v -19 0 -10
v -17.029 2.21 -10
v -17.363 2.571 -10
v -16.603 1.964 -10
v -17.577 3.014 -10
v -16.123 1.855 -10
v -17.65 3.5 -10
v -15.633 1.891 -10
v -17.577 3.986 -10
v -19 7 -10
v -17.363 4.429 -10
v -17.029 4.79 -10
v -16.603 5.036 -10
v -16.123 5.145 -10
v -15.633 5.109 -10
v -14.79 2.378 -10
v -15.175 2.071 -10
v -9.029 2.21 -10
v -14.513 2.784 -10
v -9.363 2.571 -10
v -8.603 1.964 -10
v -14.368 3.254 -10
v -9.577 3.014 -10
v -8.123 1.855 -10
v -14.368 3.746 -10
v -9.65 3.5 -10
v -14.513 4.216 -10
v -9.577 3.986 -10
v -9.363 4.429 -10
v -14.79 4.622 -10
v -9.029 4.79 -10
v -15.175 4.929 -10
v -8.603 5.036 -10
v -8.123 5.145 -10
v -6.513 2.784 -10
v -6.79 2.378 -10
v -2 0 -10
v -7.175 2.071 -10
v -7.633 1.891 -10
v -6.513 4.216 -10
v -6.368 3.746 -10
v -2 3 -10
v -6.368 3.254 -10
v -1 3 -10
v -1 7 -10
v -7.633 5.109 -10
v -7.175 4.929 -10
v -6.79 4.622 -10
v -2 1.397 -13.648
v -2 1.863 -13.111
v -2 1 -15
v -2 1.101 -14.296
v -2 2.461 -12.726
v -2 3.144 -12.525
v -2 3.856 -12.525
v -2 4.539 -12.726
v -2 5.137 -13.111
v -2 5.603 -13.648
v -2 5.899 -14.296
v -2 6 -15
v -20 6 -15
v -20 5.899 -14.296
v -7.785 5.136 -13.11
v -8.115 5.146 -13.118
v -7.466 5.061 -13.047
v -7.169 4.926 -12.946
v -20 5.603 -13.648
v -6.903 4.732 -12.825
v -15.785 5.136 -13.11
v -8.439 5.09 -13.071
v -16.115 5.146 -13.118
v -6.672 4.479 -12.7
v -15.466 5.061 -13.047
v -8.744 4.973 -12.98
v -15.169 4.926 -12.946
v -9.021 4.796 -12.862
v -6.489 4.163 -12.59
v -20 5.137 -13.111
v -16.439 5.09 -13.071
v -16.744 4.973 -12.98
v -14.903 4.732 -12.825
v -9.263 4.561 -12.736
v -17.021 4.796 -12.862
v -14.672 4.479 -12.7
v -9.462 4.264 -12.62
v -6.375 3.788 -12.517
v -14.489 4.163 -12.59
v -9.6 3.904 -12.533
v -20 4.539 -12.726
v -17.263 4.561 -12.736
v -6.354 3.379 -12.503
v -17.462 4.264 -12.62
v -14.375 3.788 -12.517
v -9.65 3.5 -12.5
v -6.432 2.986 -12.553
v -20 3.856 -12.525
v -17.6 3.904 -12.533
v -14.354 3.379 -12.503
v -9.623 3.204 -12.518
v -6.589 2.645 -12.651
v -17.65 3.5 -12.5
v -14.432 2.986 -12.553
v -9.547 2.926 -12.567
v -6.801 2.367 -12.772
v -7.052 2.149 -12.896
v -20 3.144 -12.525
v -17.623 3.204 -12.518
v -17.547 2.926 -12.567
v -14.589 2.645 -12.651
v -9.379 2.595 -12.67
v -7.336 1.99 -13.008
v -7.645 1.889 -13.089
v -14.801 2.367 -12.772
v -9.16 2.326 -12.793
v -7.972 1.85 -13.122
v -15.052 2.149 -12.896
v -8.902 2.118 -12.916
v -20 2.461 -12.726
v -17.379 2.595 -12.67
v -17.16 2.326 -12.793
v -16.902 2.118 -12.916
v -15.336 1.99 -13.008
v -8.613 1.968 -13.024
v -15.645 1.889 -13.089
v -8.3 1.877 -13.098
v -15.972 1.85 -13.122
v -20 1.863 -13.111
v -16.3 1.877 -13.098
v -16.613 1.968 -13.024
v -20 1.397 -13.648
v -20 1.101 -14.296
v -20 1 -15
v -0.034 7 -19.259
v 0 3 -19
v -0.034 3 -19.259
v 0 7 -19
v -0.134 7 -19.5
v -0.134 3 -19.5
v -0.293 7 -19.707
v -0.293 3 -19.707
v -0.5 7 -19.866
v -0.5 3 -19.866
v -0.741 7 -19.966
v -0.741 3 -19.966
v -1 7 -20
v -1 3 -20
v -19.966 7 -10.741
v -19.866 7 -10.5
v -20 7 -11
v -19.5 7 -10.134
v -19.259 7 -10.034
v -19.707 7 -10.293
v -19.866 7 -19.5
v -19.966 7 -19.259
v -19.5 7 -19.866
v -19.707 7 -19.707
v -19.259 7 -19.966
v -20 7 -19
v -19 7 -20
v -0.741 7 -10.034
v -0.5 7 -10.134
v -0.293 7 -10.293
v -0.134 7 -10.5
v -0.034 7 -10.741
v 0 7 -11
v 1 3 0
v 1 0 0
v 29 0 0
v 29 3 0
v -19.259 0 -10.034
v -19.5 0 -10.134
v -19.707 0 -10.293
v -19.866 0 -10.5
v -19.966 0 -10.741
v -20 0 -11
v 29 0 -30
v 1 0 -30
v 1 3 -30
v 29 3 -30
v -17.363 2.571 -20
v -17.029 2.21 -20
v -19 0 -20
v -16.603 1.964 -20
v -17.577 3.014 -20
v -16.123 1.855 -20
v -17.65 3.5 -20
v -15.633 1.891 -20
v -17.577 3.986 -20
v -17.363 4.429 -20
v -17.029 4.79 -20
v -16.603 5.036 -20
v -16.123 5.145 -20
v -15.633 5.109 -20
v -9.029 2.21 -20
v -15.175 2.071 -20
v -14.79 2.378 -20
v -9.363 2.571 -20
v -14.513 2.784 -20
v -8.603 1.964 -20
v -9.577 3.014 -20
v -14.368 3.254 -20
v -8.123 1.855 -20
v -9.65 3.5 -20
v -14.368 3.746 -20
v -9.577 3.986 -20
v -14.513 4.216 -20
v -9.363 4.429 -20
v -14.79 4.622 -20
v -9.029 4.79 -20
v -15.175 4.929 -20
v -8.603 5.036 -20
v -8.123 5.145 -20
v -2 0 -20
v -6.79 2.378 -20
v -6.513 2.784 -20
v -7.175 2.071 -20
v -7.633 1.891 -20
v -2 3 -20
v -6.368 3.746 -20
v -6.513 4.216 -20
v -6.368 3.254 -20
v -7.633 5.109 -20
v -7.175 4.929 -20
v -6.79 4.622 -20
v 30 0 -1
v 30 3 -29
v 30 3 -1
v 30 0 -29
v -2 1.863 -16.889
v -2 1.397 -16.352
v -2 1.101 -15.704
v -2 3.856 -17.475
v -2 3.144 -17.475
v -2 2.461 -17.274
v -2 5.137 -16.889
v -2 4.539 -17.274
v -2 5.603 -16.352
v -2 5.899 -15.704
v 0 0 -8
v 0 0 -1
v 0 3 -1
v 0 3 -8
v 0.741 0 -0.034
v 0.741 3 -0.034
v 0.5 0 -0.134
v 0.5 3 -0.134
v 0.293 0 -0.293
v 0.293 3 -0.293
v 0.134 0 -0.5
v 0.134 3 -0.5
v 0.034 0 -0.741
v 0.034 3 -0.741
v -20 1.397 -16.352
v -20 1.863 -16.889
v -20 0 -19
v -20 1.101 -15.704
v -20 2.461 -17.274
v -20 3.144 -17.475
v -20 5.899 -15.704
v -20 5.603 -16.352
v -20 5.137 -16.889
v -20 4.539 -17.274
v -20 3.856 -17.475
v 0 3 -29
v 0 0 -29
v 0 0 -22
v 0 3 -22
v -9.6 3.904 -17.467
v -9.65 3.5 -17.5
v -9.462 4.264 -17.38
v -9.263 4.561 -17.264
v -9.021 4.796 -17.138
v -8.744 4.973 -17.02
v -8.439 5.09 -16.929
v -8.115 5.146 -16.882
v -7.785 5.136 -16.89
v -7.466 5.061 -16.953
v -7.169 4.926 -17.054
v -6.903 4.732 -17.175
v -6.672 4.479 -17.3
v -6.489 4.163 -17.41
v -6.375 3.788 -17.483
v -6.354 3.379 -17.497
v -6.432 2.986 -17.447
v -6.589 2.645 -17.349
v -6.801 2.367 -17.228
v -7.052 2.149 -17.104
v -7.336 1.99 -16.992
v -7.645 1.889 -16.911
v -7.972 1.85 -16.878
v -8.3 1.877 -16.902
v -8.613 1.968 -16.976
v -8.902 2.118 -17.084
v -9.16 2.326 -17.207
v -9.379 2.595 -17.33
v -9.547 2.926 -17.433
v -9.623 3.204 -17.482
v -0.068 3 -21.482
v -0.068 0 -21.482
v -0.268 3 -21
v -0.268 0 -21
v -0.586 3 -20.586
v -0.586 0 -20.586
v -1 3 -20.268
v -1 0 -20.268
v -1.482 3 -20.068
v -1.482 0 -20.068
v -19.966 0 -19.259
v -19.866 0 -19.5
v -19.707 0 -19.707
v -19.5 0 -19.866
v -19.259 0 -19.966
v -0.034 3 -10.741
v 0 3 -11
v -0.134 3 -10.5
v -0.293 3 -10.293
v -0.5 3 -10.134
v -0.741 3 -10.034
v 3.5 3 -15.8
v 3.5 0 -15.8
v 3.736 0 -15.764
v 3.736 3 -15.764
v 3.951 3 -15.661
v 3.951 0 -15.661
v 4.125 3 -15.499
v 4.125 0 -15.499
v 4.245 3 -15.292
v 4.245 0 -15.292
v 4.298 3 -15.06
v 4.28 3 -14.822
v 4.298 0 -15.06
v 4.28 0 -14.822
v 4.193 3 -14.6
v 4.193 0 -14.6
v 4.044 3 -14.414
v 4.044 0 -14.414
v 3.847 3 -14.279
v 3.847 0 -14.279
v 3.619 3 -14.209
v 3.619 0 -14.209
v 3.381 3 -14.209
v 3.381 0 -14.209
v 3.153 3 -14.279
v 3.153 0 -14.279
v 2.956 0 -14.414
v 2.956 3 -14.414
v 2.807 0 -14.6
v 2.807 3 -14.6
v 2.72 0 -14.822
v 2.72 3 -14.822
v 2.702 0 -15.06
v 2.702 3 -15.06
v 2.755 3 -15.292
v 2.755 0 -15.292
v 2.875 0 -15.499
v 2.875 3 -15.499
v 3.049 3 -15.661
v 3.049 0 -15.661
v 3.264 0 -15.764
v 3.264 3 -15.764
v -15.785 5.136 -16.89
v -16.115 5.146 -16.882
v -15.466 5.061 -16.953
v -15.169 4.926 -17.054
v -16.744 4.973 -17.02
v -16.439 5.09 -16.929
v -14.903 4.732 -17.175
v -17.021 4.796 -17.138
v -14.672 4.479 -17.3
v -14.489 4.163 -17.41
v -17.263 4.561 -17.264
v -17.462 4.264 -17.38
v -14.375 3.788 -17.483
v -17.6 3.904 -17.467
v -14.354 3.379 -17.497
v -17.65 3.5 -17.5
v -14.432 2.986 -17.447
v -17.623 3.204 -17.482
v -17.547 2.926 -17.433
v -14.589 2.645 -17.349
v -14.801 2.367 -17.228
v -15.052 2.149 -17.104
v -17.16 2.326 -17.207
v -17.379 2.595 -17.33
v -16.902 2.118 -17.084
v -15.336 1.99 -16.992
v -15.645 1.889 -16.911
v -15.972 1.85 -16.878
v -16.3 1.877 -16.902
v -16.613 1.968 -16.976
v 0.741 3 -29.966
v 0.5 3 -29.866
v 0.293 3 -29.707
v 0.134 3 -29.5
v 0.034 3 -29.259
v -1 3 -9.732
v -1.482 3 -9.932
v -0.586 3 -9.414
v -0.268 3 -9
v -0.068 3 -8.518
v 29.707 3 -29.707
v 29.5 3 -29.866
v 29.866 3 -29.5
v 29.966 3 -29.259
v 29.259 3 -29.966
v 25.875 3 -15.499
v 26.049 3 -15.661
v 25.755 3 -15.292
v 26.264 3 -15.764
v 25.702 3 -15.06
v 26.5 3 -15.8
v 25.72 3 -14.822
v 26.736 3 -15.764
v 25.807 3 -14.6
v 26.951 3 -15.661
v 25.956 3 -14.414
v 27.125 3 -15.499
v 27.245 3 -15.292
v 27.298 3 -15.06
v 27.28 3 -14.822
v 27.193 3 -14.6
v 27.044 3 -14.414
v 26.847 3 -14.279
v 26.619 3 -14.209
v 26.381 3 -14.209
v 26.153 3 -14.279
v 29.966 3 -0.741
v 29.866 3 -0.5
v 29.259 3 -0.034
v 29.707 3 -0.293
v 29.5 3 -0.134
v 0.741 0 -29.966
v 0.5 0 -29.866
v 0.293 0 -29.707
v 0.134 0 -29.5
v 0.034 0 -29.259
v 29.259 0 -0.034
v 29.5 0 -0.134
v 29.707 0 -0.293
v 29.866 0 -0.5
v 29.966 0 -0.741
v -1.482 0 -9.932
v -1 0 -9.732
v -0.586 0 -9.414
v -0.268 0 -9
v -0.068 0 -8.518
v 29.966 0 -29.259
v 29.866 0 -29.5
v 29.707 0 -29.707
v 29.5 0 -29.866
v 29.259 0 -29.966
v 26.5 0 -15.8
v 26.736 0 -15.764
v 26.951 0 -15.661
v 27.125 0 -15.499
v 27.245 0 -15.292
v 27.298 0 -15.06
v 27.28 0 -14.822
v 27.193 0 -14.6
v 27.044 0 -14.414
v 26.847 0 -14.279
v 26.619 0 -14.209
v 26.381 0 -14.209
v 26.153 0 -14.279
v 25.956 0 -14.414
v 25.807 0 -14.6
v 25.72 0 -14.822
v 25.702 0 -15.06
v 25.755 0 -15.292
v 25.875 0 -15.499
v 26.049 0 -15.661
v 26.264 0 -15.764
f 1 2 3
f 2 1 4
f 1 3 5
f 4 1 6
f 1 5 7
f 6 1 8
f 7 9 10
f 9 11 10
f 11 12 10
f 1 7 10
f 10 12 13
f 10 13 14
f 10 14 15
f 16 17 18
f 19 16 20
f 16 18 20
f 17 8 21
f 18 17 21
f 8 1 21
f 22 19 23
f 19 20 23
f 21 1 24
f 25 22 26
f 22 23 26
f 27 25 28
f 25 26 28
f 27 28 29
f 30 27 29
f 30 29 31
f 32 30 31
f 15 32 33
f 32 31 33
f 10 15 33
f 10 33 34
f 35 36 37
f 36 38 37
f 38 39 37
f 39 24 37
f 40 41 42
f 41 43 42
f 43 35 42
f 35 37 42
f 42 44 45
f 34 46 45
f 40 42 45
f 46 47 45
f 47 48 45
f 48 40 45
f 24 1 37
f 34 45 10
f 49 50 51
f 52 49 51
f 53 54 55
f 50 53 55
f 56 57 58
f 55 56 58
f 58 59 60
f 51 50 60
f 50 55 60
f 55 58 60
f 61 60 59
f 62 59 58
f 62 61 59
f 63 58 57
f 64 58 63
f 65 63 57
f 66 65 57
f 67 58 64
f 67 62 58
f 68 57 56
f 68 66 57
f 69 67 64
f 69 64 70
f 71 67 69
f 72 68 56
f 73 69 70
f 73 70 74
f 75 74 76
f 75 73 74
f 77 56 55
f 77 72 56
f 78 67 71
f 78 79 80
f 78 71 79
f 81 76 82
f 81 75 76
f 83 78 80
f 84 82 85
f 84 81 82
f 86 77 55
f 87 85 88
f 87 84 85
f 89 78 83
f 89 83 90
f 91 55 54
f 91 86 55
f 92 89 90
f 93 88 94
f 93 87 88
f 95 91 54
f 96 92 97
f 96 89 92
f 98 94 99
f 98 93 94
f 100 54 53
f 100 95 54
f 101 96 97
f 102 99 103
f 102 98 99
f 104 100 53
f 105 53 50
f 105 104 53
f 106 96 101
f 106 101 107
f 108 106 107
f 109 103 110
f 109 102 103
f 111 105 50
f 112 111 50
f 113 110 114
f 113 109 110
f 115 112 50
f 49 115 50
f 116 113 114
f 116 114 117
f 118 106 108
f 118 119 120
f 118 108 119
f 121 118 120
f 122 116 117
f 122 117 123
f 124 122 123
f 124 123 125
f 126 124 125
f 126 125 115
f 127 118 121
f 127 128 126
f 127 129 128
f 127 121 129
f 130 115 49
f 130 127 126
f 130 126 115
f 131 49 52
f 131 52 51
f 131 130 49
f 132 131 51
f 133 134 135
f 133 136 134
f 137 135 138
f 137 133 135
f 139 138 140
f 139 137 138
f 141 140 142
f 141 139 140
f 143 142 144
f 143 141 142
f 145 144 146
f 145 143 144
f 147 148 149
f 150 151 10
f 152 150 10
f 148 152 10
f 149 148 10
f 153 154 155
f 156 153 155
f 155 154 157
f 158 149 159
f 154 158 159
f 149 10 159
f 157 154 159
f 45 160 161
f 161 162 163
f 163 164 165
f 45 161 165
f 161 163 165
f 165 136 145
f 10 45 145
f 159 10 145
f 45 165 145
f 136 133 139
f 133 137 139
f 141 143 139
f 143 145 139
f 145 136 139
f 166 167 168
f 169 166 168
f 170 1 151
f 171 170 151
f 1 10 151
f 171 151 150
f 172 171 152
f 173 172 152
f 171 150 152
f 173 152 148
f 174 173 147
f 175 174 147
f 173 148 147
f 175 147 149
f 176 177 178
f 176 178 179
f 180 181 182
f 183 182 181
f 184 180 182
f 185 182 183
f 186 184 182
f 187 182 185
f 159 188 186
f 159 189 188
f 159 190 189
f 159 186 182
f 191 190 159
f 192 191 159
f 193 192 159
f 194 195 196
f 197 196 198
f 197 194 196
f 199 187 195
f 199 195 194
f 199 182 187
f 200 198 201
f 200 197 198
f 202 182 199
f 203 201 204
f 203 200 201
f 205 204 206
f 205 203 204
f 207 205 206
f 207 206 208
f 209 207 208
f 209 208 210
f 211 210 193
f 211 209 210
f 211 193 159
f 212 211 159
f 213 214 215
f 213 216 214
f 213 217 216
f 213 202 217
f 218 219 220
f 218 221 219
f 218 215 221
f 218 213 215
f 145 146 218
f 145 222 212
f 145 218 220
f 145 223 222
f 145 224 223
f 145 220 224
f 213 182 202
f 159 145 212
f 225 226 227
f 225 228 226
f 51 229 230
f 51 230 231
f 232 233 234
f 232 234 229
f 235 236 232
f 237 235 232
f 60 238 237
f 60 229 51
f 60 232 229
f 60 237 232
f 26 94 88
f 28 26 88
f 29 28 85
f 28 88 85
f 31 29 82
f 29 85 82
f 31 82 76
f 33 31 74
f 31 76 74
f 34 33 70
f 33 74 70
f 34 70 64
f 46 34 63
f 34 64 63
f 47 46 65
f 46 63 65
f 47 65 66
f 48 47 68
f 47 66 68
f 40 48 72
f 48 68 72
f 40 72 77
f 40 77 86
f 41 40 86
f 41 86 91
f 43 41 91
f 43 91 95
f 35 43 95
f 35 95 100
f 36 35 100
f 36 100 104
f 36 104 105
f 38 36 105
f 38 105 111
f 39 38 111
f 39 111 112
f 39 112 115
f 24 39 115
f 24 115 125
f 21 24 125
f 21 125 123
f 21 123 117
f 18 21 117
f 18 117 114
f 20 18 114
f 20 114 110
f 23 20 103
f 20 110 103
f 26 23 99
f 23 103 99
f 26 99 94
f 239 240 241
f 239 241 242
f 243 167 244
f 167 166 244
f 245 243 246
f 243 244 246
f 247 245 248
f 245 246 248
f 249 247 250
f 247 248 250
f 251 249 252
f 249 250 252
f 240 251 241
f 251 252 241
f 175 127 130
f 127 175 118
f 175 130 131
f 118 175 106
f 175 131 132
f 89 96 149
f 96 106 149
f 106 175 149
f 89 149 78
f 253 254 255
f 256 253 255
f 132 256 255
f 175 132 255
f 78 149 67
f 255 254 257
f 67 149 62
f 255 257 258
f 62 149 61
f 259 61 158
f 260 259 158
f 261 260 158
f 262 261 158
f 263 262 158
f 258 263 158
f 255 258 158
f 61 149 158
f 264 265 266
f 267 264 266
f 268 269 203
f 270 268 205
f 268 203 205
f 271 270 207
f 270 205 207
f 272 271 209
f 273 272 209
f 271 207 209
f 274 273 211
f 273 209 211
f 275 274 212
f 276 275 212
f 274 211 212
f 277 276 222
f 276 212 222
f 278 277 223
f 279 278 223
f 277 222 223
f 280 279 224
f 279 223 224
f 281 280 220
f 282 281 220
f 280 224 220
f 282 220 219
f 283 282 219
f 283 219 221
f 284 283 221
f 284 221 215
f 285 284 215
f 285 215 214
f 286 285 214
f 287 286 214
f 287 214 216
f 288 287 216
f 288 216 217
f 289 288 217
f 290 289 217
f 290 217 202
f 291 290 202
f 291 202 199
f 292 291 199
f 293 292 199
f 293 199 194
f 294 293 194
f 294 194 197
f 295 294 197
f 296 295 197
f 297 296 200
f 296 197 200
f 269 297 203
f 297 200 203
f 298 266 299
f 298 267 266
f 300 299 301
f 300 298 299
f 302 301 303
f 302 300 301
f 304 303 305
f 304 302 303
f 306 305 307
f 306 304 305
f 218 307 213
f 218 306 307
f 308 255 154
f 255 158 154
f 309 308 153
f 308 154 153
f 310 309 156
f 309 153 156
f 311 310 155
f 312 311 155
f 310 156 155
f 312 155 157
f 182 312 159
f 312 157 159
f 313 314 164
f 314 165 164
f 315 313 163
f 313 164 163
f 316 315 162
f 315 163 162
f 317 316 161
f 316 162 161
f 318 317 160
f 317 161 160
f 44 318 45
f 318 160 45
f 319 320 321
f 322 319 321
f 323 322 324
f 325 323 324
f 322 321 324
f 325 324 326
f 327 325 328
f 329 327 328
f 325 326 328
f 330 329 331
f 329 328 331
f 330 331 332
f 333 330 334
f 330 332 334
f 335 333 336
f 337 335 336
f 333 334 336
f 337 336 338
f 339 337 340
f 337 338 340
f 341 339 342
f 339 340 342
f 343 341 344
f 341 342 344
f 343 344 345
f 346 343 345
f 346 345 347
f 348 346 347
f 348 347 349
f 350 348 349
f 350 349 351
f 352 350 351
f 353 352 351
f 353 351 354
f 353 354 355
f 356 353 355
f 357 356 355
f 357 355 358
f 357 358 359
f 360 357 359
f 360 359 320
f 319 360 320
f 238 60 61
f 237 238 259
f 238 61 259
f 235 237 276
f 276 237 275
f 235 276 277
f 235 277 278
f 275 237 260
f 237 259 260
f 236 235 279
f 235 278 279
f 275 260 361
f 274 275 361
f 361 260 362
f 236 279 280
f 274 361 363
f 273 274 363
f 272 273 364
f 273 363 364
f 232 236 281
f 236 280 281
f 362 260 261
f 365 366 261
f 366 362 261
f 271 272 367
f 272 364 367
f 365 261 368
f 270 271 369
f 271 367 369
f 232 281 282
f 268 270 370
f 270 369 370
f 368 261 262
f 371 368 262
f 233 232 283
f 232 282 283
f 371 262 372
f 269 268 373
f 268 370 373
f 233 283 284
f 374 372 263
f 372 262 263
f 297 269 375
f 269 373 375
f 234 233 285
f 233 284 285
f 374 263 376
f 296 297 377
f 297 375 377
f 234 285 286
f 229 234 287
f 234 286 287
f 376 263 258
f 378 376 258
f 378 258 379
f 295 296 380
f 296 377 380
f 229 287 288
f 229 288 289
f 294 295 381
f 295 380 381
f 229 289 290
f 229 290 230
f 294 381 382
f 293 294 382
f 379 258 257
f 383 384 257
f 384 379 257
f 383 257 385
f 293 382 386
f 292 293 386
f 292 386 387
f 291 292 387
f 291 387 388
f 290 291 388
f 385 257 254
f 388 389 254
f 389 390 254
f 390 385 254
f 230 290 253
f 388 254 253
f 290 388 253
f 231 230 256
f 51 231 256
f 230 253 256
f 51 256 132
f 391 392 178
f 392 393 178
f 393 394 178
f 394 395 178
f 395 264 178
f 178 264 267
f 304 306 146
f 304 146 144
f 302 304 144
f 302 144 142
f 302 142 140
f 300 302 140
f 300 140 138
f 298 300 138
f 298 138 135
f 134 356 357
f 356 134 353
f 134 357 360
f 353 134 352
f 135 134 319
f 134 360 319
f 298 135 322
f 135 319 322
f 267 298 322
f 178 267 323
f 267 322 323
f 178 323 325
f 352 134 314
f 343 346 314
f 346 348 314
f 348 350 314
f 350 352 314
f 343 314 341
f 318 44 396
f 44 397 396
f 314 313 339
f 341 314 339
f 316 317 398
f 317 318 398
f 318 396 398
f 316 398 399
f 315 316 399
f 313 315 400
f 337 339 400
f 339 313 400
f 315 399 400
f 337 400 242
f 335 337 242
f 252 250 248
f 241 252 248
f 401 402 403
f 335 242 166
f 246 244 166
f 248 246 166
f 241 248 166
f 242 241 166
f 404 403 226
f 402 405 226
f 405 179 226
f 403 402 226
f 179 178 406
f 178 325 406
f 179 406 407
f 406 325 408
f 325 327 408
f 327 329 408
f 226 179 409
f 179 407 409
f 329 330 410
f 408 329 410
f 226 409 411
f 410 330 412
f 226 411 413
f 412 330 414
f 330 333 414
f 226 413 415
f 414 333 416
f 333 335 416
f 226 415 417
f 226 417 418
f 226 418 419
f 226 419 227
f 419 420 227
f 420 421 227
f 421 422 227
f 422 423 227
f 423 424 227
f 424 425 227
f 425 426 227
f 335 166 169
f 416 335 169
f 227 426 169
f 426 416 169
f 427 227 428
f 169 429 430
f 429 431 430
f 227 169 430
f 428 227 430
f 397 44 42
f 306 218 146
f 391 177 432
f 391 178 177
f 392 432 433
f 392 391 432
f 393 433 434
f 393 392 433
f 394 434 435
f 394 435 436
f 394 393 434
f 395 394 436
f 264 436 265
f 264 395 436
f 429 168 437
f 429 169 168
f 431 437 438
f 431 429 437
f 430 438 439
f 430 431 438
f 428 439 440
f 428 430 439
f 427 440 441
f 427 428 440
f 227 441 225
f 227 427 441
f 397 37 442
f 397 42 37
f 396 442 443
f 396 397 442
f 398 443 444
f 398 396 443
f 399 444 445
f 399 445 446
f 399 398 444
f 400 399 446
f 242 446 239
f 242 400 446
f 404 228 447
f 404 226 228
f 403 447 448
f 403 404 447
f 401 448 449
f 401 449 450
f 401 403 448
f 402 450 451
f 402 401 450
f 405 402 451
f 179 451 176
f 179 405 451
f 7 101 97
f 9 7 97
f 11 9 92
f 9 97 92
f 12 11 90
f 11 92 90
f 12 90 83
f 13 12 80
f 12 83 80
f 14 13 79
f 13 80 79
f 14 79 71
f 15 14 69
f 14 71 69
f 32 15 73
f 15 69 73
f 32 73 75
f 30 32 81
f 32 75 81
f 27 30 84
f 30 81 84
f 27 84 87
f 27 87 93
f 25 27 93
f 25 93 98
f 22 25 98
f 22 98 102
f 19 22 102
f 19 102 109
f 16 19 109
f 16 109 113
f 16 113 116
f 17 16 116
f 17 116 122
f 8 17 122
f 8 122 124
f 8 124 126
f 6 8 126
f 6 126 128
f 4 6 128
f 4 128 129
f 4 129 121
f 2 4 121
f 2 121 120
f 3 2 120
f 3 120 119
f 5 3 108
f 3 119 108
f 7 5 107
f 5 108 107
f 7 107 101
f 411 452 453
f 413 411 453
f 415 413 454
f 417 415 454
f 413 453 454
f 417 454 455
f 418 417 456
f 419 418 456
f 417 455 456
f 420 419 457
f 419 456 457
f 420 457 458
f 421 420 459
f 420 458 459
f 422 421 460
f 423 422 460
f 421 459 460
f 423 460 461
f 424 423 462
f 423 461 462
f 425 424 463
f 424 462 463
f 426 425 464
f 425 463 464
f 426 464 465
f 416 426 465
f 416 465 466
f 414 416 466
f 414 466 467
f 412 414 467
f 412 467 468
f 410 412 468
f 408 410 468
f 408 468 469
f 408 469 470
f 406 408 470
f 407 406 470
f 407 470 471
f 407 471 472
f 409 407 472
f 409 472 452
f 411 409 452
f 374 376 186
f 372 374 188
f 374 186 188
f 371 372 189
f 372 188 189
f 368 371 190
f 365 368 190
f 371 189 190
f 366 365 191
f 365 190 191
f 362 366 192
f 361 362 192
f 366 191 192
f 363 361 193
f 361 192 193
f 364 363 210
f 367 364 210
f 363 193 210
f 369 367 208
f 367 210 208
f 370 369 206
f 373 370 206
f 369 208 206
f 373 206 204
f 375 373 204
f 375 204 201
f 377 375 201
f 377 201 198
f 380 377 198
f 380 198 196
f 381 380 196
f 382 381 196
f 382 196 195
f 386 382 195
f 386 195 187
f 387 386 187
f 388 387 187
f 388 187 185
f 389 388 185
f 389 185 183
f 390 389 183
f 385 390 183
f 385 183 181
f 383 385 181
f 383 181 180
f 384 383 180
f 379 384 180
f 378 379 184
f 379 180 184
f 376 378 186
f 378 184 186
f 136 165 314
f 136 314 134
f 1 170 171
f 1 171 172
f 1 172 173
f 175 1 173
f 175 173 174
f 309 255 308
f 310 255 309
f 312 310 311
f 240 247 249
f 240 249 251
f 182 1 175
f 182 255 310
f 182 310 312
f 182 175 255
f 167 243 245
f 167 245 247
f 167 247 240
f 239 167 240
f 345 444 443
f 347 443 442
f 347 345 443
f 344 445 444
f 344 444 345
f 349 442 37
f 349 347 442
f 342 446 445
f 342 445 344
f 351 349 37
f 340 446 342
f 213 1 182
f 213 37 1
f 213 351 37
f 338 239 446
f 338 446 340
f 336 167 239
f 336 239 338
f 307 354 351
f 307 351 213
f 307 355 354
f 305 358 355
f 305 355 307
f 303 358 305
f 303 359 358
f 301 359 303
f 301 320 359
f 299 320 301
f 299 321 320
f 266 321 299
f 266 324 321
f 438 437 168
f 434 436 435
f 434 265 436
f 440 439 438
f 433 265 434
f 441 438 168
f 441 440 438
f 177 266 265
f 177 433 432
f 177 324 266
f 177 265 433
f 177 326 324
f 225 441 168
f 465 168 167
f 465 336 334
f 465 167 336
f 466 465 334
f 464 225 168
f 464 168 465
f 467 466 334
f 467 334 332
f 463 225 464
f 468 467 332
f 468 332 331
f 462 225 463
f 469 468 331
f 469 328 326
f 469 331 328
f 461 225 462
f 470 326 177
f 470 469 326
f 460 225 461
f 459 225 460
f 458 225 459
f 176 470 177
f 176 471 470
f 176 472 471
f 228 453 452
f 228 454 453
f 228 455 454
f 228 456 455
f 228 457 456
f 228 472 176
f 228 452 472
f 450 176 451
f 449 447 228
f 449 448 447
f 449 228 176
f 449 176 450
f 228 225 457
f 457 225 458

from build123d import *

# Parameters (mm, degrees)
SKETCH1_W             = 30
SKETCH1_H             = 15
BOSS_EXTRUDE1_DEPTH   = 3
SKETCH2_W             = 5
SKETCH2_H             = 7
BOSS_EXTRUDE2_DEPTH   = 20
CUT_EXTRUDE1_DEPTH    = 18
FILLET2_R             = 2
FILLET3_R             = 1
M2X0_4_TAPPED_HOLE1_D = 1.6
M4X0_7_TAPPED_HOLE1_D = 3.3


with BuildPart() as part:
    # Sketch1 → Boss-Extrude1 (new body)
    with BuildSketch(Plane(origin=(0, 0, 0), x_dir=(1, 0, 0), z_dir=(0, 1, 0))):
        with Locations((15, 7.5)):
            Rectangle(SKETCH1_W, SKETCH1_H)
    extrude(amount=BOSS_EXTRUDE1_DEPTH)

    # Sketch2 → Boss-Extrude2 (add)
    with BuildSketch(Plane.ZY):
        with Locations((-12.5, 3.5)):
            Rectangle(SKETCH2_W, SKETCH2_H)
    extrude(amount=BOSS_EXTRUDE2_DEPTH)

    # Sketch3 → Cut-Extrude1 (cut)
    with BuildSketch(Plane.ZY.offset(20)):
        with BuildLine():
            Line((-15, 1), (-15, 6))
            ThreePointArc((-15, 6), (-12.5, 3.5), (-15, 1))
        make_face()
    extrude(amount=-CUT_EXTRUDE1_DEPTH, mode=Mode.SUBTRACT)

    # Mirror1: part across plane


with BuildPart() as part_1:
    add(part.part)
    add(part.part.mirror(Plane(origin=(0, 3, -15), x_dir=(1, 0, 0), z_dir=(0, 0, 1))))

    # Fillet2
    fillet2_edges = [part_1.edges().sort_by_distance(p)[0] for p in [
        (0, 1.5, -10),
        (0, 1.5, -20),
    ]]
    fillet(fillet2_edges, radius=FILLET2_R)

    # Fillet3
    fillet3_edges = [part_1.edges().sort_by_distance(p)[0] for p in [
        (0, 5, -10),
        (-20, 3.5, -10),
        (0, 1.5, -30),
        (30, 1.5, -30),
        (-20, 3.5, -20),
        (0, 5, -20),
        (30, 1.5, 0),
        (0, 1.5, 0),
    ]]
    fillet(fillet3_edges, radius=FILLET3_R)

    # M2x0.4 Tapped Hole1 (through all)
    with Locations(Plane(origin=(3.5, 3, -15), x_dir=(0, 0, 1), z_dir=(0, 1, 0))):
        with Locations((0, 0), (0, 23)):
            Hole(M2X0_4_TAPPED_HOLE1_D / 2)

    # M4x0.7 Tapped Hole1 (through all)
    with Locations(Plane(origin=(-16, 3.5, -10), x_dir=(1, 0, 0), z_dir=(0, 0, 1))):
        with Locations((0, 0), (8, 0)):
            Hole(M4X0_7_TAPPED_HOLE1_D / 2)


solid = part_1.part
